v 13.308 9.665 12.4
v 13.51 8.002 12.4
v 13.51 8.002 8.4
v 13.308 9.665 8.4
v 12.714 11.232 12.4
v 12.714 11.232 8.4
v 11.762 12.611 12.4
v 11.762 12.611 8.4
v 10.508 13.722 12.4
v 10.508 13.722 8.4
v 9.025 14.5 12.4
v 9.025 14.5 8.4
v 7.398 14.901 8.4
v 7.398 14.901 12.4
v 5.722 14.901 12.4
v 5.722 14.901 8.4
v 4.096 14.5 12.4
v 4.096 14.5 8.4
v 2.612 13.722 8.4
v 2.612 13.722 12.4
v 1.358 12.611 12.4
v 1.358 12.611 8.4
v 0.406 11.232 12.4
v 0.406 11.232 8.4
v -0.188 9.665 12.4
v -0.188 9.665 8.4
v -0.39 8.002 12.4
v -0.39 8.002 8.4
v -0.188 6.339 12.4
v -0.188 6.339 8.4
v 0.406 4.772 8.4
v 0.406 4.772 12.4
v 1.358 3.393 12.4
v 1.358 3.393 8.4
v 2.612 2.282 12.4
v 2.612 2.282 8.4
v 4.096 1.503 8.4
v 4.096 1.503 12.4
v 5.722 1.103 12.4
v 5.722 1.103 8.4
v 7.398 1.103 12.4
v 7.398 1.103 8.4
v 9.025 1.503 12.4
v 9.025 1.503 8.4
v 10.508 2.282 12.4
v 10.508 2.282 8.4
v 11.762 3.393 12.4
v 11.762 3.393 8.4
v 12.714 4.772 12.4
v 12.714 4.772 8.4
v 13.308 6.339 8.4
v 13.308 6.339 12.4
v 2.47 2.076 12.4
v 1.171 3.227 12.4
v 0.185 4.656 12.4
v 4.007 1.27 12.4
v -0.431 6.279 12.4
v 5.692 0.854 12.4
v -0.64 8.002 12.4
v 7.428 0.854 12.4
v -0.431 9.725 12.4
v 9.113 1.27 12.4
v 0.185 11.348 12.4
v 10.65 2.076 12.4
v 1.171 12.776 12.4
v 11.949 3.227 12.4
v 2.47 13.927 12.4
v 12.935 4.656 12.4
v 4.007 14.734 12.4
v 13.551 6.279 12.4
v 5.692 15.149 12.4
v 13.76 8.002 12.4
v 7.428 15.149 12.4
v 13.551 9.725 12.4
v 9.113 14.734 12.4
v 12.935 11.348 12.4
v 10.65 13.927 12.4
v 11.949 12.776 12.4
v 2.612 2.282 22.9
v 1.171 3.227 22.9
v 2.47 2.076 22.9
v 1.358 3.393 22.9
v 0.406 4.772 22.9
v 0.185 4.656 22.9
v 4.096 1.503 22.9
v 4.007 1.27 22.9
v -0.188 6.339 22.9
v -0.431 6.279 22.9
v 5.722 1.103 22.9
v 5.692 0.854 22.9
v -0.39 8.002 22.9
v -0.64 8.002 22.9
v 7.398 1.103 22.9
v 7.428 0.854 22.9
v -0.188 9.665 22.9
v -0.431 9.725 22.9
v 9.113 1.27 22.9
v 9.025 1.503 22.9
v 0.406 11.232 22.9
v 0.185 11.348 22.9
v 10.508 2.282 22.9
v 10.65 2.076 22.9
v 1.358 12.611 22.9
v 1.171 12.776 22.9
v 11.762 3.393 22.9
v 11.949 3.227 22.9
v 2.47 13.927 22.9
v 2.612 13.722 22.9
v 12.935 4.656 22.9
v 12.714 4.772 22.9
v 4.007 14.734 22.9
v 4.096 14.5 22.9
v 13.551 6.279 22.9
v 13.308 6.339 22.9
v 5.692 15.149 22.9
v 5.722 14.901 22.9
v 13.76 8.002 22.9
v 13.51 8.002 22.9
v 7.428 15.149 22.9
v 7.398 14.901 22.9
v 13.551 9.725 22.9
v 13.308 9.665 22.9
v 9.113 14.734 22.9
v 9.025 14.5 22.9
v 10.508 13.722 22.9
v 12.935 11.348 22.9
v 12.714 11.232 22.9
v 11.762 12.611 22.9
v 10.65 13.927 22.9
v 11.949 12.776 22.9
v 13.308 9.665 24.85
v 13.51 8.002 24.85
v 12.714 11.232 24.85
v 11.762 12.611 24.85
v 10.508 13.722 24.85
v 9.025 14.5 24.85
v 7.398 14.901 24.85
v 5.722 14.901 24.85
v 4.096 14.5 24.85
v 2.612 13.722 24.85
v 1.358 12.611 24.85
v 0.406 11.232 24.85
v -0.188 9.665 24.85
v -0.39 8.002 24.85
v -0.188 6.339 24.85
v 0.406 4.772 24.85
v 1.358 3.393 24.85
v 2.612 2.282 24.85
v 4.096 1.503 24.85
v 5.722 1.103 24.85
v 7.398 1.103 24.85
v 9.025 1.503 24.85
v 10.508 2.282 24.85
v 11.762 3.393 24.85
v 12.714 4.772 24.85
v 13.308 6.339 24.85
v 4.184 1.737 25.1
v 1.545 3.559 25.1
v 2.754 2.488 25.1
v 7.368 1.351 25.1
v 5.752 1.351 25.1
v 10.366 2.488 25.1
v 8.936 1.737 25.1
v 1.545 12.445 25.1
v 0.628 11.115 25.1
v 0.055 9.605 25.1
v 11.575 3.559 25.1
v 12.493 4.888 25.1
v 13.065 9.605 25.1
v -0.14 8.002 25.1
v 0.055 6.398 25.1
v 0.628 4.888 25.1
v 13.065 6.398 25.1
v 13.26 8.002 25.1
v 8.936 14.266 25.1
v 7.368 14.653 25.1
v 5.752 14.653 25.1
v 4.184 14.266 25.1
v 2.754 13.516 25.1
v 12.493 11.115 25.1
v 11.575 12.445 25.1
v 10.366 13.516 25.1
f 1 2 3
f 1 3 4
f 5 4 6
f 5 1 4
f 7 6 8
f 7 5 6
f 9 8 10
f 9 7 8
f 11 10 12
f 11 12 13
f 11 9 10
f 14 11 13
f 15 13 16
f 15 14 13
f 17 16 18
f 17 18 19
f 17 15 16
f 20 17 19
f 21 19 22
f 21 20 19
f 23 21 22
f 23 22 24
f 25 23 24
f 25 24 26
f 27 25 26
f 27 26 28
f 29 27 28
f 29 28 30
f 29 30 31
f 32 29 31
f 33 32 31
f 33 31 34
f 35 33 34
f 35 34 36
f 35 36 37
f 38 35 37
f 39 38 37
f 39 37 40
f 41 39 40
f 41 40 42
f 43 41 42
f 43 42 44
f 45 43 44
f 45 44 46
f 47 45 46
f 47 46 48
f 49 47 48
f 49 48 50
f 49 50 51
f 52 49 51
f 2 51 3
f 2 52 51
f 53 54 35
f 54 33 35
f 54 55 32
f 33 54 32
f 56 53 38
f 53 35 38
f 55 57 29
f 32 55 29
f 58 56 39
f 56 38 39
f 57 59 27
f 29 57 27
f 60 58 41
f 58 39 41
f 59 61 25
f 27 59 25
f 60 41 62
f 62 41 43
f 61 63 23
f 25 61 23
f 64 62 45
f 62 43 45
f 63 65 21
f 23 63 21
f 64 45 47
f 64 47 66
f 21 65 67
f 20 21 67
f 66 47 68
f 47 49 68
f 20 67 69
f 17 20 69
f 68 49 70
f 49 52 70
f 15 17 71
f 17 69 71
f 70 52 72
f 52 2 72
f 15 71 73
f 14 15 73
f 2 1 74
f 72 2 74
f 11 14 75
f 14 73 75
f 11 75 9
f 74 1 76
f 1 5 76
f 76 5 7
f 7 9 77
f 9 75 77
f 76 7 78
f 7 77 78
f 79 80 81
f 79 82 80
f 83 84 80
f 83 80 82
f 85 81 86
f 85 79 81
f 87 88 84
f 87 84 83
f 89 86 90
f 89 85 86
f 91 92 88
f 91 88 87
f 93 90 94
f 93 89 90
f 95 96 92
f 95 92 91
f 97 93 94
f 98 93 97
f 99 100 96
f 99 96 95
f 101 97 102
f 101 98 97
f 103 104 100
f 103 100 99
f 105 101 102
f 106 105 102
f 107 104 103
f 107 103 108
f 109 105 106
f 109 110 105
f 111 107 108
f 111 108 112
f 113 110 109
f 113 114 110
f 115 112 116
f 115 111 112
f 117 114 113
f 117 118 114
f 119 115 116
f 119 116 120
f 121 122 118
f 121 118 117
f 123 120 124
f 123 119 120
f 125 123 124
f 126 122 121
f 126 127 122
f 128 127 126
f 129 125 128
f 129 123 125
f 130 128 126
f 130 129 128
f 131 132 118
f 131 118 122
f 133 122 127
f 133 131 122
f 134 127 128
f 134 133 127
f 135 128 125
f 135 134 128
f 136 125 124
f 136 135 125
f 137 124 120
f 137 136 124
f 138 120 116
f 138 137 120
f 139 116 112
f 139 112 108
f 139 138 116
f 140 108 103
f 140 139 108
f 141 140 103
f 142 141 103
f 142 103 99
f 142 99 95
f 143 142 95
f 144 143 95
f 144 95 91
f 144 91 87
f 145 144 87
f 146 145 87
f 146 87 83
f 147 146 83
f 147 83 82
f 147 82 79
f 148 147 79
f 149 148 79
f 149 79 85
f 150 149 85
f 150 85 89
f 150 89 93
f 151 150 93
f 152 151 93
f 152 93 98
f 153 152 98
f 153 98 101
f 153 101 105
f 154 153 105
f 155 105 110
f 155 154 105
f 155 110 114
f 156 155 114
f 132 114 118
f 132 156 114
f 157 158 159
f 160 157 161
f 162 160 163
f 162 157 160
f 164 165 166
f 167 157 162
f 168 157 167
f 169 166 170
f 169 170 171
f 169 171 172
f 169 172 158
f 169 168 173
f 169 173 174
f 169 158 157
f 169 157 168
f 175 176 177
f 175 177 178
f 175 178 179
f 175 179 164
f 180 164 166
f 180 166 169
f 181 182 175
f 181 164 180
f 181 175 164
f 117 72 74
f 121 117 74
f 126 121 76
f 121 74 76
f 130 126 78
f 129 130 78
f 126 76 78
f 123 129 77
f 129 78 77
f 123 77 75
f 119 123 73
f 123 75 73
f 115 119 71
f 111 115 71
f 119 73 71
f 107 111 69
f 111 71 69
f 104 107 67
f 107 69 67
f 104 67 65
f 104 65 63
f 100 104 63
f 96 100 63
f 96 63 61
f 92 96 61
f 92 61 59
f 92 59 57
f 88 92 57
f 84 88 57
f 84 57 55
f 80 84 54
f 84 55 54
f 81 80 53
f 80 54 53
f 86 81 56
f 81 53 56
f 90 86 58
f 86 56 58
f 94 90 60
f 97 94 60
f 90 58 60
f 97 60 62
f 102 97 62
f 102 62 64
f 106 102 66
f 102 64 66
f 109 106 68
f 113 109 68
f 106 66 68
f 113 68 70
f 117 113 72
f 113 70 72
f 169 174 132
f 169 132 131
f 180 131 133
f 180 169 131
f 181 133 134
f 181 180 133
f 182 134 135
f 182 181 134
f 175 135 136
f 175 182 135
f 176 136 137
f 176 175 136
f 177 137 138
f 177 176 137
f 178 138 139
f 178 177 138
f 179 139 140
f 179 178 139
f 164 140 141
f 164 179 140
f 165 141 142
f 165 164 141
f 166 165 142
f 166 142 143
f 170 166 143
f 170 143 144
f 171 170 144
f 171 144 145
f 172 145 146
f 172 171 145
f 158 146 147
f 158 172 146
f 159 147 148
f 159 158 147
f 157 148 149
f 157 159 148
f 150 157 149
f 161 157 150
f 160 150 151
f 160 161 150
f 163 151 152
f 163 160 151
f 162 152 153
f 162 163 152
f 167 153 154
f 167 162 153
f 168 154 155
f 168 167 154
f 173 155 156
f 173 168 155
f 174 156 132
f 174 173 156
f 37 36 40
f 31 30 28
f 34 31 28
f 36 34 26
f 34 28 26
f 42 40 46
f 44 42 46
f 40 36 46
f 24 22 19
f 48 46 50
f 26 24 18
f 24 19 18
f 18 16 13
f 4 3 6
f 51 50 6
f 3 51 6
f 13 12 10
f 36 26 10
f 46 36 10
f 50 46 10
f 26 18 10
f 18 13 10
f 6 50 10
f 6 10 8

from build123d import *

# Parameters (mm, degrees)
BOSS_EXTRUDE1_START = 3.7
SKETCH2_R           = 6.95
BOSS_EXTRUDE1_DEPTH = 16.7
BOSS_EXTRUDE2_START = 1.5
SKETCH2_4_R         = 7.2
SKETCH2_4_R_2       = 6.95
BOSS_EXTRUDE2_DEPTH = 10.5
CHAMFER1_SIZE       = 0.25


with BuildPart() as part:
    # Sketch2 → Boss-Extrude1 (new body)
    with BuildSketch(Plane(origin=(0, -9.35e-07, 21.39999965), x_dir=(1, 0, 0), z_dir=(7.64274180725769e-15, -4.371138800000007e-08, 0.999999999999999)).offset(BOSS_EXTRUDE1_START)):
        with Locations((6.560058174, 8.001830475)):
            Circle(SKETCH2_R)
    extrude(amount=-BOSS_EXTRUDE1_DEPTH)

    # Sketch2<4> → Boss-Extrude2 (add)
    with BuildSketch(Plane(origin=(0, -9.35e-07, 21.39999965), x_dir=(1, 0, 0), z_dir=(7.64274180725769e-15, -4.371138800000007e-08, 0.999999999999999)).offset(BOSS_EXTRUDE2_START)):
        with Locations((6.560058174, 8.001830475)):
            Circle(SKETCH2_4_R)
        with Locations((6.560058174, 8.001830475)):
            Circle(SKETCH2_4_R_2, mode=Mode.SUBTRACT)
    extrude(amount=-BOSS_EXTRUDE2_DEPTH)

    # Chamfer1
    chamfer1_edges = [part.edges().sort_by_distance(p)[0] for p in [
        (-0.389941826, 8.001829378, 25.1),
    ]]
    chamfer(chamfer1_edges, length=CHAMFER1_SIZE)


solid = part.part
